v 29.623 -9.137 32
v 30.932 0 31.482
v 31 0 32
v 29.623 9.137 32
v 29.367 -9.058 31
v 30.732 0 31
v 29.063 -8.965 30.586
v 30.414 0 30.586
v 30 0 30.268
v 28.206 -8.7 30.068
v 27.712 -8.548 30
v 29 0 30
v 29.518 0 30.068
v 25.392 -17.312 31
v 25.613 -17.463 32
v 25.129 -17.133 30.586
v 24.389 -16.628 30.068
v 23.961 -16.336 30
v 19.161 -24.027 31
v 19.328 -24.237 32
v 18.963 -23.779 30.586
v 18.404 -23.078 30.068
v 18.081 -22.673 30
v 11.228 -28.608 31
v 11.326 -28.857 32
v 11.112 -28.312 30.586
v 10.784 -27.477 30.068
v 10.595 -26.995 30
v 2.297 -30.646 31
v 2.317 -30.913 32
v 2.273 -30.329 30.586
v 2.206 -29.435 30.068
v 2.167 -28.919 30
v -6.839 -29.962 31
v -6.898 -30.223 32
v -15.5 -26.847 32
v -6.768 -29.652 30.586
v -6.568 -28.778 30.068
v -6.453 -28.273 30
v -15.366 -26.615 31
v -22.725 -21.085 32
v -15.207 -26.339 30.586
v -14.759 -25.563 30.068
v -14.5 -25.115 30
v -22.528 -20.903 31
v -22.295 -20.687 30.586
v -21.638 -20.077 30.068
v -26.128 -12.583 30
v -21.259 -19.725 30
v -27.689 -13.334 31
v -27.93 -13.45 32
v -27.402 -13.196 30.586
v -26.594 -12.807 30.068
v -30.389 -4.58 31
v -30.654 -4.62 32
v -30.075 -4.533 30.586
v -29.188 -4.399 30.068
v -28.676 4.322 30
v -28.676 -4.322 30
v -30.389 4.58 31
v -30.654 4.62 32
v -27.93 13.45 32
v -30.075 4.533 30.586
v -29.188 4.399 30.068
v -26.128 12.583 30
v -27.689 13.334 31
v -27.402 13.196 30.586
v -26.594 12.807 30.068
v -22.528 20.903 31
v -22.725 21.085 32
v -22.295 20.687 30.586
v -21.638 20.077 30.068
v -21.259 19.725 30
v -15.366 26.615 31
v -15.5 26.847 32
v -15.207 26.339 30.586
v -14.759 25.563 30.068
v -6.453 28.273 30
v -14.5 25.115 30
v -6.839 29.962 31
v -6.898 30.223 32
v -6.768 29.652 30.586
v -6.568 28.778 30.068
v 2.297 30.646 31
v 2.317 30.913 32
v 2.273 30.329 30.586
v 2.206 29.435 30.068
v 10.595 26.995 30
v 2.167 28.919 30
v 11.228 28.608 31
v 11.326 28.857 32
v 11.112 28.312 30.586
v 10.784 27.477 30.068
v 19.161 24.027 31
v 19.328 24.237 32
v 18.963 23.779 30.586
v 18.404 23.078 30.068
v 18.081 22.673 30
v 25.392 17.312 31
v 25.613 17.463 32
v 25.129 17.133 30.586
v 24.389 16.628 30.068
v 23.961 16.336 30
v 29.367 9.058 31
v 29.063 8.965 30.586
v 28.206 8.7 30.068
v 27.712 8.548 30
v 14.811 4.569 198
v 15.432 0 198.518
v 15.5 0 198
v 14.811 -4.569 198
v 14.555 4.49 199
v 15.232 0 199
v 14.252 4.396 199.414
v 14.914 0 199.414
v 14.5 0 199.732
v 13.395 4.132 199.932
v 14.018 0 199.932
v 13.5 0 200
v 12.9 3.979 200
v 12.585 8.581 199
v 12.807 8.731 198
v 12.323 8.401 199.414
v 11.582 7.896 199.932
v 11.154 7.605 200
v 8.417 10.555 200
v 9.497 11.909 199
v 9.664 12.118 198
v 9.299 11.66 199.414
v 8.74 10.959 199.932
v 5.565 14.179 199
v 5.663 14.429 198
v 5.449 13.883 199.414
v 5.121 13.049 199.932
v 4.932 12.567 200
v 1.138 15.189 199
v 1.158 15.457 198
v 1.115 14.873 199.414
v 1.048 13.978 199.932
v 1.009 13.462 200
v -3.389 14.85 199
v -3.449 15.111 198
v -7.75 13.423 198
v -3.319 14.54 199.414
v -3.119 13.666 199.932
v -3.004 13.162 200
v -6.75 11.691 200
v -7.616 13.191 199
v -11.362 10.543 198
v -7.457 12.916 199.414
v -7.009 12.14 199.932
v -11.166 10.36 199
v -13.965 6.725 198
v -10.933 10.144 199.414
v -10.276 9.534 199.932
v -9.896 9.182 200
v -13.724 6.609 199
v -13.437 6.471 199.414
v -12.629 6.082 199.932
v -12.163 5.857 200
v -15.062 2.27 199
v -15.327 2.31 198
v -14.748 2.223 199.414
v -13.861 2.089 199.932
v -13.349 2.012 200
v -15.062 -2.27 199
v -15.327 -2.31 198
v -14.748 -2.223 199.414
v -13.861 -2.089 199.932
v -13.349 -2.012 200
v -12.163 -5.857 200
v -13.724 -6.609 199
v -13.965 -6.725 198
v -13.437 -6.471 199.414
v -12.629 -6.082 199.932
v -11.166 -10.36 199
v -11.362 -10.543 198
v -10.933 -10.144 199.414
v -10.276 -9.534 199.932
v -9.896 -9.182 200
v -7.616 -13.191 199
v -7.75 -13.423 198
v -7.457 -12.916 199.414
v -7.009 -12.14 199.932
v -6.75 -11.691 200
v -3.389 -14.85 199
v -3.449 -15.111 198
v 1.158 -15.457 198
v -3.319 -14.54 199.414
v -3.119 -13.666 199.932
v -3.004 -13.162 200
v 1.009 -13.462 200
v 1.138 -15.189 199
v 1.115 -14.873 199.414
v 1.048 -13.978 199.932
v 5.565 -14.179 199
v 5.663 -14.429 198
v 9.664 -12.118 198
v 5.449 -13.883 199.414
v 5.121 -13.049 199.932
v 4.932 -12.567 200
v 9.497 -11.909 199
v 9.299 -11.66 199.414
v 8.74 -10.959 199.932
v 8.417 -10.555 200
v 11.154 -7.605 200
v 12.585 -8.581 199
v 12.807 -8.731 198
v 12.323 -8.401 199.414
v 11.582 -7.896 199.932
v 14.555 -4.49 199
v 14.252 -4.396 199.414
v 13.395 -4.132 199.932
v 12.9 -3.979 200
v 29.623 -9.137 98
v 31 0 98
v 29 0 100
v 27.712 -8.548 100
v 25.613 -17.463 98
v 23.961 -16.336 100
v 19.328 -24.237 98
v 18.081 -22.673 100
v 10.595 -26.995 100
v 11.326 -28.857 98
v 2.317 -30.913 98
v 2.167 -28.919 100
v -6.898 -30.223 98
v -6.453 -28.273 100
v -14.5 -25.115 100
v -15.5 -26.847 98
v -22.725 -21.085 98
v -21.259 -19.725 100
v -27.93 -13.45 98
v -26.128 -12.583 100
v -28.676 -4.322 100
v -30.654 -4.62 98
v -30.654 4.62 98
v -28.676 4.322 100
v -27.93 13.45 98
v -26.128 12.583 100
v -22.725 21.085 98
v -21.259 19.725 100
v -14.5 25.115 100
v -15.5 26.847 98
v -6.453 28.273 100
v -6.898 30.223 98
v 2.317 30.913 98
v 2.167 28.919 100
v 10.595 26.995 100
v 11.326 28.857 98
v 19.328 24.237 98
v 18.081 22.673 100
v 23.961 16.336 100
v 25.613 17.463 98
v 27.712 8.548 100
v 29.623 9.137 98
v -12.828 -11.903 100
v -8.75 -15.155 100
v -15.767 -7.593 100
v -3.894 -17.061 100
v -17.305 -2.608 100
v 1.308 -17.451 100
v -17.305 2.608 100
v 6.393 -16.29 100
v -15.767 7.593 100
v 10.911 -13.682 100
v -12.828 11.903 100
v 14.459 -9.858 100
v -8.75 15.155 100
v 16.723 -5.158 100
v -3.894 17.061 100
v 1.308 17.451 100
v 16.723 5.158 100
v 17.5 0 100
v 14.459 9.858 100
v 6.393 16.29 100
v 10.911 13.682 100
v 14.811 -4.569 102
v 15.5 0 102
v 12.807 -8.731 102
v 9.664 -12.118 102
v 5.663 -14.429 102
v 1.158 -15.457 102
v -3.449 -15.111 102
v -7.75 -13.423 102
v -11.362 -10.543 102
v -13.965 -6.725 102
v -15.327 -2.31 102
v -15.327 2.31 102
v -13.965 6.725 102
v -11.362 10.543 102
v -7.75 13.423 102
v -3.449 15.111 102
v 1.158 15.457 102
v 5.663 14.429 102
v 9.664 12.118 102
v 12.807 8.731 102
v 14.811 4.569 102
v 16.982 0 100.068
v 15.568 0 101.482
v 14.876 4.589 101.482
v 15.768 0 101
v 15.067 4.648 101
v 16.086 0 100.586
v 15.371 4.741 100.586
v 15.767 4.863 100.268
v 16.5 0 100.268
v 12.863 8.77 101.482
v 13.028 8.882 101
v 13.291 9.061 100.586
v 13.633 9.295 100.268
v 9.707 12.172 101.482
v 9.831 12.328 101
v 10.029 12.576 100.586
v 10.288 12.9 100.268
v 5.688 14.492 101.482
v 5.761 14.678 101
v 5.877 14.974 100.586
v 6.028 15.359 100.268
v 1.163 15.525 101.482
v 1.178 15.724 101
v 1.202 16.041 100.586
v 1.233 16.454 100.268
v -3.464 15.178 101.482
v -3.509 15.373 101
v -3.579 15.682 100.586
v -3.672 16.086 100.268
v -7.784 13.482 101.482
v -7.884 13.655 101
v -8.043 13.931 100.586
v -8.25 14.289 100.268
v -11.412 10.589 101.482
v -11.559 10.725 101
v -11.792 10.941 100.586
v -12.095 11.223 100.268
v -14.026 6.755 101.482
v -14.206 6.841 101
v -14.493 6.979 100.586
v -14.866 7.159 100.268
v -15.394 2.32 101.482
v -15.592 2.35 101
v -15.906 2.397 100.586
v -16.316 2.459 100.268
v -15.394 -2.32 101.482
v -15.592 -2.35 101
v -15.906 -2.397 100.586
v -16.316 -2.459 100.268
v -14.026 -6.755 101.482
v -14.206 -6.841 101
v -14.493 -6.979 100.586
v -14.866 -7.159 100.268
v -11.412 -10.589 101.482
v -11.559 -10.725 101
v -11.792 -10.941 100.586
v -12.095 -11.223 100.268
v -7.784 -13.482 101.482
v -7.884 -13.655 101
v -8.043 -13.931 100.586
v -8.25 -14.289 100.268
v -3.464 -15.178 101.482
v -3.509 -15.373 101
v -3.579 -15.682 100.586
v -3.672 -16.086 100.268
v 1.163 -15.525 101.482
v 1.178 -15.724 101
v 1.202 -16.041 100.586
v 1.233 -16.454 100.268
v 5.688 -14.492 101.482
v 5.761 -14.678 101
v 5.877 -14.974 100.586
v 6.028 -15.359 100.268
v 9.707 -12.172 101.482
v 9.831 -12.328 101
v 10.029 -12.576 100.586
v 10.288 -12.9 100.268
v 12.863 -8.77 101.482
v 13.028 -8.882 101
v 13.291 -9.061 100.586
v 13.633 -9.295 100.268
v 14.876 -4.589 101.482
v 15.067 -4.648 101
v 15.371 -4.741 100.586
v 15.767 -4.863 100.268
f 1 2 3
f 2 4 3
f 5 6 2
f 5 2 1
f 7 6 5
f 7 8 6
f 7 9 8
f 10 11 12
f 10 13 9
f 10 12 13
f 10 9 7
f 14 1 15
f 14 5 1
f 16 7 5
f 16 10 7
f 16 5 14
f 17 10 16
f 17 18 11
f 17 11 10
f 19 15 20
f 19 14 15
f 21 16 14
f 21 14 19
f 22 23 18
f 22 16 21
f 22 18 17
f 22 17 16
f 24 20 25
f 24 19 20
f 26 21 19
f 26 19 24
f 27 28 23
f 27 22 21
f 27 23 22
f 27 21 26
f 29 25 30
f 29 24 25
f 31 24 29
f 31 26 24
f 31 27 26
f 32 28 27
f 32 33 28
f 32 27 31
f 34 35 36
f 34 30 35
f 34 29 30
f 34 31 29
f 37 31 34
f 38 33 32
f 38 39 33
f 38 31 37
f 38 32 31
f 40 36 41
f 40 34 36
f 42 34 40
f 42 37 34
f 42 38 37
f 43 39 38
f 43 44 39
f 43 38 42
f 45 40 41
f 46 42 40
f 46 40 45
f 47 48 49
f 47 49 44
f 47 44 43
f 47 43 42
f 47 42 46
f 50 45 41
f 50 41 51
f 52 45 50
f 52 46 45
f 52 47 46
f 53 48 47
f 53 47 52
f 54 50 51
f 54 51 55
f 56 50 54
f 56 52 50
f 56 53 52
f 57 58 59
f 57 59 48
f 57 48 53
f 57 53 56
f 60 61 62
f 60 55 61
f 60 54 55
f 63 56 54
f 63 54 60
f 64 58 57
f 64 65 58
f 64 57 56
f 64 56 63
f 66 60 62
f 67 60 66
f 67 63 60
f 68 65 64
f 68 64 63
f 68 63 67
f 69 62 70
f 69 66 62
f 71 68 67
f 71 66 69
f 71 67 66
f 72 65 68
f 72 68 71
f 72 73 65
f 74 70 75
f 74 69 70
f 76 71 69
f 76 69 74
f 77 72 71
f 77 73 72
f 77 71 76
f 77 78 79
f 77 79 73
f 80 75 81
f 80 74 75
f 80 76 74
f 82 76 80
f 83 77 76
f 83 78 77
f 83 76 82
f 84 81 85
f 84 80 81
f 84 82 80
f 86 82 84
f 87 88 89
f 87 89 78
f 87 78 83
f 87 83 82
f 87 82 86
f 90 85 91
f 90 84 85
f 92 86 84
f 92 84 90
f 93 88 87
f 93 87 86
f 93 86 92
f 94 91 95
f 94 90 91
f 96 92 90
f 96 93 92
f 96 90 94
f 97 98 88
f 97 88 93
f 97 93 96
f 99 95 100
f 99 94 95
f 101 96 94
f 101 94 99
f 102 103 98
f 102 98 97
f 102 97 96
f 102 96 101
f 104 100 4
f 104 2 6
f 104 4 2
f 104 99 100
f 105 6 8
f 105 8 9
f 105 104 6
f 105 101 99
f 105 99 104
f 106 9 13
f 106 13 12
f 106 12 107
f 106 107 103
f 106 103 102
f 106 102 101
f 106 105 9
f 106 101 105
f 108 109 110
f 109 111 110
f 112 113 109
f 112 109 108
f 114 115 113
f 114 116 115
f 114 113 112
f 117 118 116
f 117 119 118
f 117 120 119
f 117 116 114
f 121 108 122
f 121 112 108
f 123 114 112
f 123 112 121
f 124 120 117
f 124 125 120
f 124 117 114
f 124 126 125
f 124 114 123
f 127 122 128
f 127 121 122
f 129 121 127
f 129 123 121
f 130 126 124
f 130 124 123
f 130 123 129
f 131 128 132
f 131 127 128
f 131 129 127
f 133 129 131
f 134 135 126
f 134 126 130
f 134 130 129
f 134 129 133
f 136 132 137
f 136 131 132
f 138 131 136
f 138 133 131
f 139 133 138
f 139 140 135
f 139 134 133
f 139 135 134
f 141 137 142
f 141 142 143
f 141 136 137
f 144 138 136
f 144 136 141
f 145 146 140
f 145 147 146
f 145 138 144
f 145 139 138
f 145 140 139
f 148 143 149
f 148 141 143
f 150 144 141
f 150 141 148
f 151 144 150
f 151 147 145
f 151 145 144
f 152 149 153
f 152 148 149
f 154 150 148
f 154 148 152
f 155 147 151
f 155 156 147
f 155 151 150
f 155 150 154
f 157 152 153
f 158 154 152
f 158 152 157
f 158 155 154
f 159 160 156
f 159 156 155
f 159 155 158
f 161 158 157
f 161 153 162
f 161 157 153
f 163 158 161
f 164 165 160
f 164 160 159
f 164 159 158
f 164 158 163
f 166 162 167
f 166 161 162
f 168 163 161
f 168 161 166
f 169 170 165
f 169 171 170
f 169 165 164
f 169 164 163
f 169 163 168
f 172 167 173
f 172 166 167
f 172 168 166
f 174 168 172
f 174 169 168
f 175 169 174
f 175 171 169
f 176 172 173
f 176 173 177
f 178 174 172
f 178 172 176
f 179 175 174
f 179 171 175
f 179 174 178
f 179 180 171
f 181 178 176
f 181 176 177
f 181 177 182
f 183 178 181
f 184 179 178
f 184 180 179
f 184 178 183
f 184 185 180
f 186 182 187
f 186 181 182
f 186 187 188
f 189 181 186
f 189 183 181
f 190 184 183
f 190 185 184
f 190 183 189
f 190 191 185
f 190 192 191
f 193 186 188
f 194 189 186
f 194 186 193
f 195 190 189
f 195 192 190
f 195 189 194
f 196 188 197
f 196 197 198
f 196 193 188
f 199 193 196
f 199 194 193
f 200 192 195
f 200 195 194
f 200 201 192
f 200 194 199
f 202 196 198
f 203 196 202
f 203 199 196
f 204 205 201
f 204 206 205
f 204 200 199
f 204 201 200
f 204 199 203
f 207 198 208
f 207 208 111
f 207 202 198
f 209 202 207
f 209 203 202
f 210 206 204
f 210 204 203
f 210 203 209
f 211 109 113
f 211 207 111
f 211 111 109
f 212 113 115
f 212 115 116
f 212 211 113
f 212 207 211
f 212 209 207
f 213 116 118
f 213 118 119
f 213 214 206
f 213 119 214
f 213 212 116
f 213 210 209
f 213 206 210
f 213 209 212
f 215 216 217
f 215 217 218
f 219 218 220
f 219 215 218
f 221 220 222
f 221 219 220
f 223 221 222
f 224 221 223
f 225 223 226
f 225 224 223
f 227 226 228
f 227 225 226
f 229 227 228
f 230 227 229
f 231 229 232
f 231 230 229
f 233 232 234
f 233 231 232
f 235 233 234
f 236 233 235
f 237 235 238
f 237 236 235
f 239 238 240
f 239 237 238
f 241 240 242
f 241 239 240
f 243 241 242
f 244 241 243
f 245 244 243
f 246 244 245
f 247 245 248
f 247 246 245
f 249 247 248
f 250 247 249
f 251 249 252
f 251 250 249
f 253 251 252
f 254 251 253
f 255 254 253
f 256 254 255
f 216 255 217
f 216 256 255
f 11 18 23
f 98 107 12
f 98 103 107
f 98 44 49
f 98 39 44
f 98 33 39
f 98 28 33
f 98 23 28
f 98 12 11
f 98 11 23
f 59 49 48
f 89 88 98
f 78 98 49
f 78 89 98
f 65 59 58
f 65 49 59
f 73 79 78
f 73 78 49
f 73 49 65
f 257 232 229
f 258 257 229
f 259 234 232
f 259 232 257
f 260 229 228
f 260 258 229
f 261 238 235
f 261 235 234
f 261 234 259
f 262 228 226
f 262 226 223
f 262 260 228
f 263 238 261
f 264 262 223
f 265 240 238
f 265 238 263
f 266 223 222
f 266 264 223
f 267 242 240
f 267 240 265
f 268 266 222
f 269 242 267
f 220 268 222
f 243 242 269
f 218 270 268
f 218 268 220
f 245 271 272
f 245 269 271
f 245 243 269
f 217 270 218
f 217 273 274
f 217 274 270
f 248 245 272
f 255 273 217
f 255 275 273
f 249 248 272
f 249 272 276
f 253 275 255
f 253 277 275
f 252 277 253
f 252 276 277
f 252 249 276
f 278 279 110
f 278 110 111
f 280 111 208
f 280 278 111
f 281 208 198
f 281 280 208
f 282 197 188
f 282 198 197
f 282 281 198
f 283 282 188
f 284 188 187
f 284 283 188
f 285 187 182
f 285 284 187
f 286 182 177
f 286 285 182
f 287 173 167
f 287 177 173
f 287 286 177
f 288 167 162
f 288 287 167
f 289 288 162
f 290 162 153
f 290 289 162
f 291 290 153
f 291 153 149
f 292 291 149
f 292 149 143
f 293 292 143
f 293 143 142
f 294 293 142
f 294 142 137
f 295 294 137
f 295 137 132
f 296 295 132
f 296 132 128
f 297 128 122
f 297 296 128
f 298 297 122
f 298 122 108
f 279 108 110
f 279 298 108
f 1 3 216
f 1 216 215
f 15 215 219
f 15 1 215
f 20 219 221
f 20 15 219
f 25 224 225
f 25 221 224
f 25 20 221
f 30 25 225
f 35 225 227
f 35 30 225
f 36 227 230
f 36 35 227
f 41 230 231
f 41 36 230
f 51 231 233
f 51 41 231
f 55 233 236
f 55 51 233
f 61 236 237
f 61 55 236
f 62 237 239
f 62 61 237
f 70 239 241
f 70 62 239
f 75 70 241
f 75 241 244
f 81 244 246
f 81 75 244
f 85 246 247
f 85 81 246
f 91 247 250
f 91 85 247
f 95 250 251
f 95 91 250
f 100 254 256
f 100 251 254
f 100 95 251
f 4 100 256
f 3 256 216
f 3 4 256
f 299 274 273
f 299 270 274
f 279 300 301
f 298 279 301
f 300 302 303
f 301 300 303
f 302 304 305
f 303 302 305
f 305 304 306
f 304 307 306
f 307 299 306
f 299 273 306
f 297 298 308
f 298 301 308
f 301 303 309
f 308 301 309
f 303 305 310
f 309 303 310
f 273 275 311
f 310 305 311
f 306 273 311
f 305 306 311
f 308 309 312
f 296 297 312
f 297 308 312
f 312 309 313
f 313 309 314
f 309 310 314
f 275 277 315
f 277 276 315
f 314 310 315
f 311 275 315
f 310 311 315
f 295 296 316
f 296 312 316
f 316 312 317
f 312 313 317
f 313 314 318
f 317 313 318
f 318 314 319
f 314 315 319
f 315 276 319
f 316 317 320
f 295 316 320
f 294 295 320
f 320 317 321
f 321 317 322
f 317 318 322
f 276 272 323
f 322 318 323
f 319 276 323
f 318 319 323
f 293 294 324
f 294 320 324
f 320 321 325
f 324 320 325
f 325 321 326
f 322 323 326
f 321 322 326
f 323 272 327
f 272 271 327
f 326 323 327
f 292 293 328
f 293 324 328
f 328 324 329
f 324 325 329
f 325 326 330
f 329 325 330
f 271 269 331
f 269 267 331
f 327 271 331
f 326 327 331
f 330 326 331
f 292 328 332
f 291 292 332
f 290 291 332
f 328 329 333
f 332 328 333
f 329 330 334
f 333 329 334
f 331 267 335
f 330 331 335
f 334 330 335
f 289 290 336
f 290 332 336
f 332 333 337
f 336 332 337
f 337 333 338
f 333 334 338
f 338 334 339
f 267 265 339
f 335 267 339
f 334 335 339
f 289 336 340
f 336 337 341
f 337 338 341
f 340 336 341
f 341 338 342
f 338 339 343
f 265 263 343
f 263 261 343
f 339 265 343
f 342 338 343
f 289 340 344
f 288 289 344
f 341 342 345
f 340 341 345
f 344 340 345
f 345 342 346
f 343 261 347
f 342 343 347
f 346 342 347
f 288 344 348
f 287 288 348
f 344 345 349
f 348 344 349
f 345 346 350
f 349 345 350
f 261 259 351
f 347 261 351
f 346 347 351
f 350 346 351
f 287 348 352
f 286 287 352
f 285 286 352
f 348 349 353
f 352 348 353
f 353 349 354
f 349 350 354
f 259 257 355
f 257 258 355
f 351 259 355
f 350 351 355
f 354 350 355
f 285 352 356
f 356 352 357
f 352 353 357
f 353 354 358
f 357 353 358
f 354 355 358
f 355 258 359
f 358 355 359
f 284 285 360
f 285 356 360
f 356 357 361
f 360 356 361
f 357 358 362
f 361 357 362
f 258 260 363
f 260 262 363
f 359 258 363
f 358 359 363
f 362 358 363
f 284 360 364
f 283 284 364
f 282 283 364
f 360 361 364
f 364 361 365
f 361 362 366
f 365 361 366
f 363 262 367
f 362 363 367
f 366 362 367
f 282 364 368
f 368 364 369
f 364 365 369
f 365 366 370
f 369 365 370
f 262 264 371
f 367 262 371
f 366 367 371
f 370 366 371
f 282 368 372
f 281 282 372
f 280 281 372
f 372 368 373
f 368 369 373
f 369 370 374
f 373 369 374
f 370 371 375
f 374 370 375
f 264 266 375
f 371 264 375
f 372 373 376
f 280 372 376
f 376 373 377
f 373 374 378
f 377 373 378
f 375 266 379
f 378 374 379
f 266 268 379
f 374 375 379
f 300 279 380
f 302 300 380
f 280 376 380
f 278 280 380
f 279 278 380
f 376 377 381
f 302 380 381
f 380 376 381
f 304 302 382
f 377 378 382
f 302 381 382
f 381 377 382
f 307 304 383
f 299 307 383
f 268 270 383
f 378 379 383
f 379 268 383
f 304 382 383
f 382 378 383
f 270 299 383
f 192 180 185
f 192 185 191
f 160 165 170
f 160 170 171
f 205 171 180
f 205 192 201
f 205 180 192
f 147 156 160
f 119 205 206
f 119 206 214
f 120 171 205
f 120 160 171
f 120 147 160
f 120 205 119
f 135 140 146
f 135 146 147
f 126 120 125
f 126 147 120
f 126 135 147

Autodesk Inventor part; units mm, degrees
ref_plane "YZ Plane" through (0, 0, 0) normal (1, 0, 0) x (0, 1, 0)
ref_plane "XZ Plane" through (0, 0, 0) normal (0, 1, 0) x (-1, 0, 0)
ref_plane "XY Plane" through (0, 0, 0) normal (0, 0, 1) x (1, 0, 0)
sketch "Sketch1" plane through (0, 0, 0) normal (0, 0, 1) x (1, 0, 0)
  circle A0 centre (0, 0) radius 31
  dimension "d0" = 62
extrude "Extrusion1" add sketch "Sketch1" along normal blind 100
chamfer "Chamfer1" distance 2 angle 45 2 edges at (-31, 0, 100) (-31, 0, 0)
sketch "Sketch2" plane through (0, 0, 100) normal (0, 0, 1) x (1, 0, 0)
  circle A0 centre (0, 0) radius 15.5
  dimension "d6" = 31
extrude "Extrusion2" add sketch "Sketch2" along normal blind 100
fillet "Fillet1" radius 2 1 edges at (-15.5, 0, 200)
fillet "Fillet2" radius 2 1 edges at (-15.5, 0, 100)
sketch "Sketch3" plane through (0, 0, 0) normal (0, 0, -1) x (-1, 0, 0)
  circle A0 centre (0, 0) radius 31
  dimension "d11" = 62
extrude "Extrusion3" cut sketch "Sketch3" against normal blind 30
fillet "Fillet3" radius 2 1 edges at (-31, 0, 30)
properties part number "S.motor"
